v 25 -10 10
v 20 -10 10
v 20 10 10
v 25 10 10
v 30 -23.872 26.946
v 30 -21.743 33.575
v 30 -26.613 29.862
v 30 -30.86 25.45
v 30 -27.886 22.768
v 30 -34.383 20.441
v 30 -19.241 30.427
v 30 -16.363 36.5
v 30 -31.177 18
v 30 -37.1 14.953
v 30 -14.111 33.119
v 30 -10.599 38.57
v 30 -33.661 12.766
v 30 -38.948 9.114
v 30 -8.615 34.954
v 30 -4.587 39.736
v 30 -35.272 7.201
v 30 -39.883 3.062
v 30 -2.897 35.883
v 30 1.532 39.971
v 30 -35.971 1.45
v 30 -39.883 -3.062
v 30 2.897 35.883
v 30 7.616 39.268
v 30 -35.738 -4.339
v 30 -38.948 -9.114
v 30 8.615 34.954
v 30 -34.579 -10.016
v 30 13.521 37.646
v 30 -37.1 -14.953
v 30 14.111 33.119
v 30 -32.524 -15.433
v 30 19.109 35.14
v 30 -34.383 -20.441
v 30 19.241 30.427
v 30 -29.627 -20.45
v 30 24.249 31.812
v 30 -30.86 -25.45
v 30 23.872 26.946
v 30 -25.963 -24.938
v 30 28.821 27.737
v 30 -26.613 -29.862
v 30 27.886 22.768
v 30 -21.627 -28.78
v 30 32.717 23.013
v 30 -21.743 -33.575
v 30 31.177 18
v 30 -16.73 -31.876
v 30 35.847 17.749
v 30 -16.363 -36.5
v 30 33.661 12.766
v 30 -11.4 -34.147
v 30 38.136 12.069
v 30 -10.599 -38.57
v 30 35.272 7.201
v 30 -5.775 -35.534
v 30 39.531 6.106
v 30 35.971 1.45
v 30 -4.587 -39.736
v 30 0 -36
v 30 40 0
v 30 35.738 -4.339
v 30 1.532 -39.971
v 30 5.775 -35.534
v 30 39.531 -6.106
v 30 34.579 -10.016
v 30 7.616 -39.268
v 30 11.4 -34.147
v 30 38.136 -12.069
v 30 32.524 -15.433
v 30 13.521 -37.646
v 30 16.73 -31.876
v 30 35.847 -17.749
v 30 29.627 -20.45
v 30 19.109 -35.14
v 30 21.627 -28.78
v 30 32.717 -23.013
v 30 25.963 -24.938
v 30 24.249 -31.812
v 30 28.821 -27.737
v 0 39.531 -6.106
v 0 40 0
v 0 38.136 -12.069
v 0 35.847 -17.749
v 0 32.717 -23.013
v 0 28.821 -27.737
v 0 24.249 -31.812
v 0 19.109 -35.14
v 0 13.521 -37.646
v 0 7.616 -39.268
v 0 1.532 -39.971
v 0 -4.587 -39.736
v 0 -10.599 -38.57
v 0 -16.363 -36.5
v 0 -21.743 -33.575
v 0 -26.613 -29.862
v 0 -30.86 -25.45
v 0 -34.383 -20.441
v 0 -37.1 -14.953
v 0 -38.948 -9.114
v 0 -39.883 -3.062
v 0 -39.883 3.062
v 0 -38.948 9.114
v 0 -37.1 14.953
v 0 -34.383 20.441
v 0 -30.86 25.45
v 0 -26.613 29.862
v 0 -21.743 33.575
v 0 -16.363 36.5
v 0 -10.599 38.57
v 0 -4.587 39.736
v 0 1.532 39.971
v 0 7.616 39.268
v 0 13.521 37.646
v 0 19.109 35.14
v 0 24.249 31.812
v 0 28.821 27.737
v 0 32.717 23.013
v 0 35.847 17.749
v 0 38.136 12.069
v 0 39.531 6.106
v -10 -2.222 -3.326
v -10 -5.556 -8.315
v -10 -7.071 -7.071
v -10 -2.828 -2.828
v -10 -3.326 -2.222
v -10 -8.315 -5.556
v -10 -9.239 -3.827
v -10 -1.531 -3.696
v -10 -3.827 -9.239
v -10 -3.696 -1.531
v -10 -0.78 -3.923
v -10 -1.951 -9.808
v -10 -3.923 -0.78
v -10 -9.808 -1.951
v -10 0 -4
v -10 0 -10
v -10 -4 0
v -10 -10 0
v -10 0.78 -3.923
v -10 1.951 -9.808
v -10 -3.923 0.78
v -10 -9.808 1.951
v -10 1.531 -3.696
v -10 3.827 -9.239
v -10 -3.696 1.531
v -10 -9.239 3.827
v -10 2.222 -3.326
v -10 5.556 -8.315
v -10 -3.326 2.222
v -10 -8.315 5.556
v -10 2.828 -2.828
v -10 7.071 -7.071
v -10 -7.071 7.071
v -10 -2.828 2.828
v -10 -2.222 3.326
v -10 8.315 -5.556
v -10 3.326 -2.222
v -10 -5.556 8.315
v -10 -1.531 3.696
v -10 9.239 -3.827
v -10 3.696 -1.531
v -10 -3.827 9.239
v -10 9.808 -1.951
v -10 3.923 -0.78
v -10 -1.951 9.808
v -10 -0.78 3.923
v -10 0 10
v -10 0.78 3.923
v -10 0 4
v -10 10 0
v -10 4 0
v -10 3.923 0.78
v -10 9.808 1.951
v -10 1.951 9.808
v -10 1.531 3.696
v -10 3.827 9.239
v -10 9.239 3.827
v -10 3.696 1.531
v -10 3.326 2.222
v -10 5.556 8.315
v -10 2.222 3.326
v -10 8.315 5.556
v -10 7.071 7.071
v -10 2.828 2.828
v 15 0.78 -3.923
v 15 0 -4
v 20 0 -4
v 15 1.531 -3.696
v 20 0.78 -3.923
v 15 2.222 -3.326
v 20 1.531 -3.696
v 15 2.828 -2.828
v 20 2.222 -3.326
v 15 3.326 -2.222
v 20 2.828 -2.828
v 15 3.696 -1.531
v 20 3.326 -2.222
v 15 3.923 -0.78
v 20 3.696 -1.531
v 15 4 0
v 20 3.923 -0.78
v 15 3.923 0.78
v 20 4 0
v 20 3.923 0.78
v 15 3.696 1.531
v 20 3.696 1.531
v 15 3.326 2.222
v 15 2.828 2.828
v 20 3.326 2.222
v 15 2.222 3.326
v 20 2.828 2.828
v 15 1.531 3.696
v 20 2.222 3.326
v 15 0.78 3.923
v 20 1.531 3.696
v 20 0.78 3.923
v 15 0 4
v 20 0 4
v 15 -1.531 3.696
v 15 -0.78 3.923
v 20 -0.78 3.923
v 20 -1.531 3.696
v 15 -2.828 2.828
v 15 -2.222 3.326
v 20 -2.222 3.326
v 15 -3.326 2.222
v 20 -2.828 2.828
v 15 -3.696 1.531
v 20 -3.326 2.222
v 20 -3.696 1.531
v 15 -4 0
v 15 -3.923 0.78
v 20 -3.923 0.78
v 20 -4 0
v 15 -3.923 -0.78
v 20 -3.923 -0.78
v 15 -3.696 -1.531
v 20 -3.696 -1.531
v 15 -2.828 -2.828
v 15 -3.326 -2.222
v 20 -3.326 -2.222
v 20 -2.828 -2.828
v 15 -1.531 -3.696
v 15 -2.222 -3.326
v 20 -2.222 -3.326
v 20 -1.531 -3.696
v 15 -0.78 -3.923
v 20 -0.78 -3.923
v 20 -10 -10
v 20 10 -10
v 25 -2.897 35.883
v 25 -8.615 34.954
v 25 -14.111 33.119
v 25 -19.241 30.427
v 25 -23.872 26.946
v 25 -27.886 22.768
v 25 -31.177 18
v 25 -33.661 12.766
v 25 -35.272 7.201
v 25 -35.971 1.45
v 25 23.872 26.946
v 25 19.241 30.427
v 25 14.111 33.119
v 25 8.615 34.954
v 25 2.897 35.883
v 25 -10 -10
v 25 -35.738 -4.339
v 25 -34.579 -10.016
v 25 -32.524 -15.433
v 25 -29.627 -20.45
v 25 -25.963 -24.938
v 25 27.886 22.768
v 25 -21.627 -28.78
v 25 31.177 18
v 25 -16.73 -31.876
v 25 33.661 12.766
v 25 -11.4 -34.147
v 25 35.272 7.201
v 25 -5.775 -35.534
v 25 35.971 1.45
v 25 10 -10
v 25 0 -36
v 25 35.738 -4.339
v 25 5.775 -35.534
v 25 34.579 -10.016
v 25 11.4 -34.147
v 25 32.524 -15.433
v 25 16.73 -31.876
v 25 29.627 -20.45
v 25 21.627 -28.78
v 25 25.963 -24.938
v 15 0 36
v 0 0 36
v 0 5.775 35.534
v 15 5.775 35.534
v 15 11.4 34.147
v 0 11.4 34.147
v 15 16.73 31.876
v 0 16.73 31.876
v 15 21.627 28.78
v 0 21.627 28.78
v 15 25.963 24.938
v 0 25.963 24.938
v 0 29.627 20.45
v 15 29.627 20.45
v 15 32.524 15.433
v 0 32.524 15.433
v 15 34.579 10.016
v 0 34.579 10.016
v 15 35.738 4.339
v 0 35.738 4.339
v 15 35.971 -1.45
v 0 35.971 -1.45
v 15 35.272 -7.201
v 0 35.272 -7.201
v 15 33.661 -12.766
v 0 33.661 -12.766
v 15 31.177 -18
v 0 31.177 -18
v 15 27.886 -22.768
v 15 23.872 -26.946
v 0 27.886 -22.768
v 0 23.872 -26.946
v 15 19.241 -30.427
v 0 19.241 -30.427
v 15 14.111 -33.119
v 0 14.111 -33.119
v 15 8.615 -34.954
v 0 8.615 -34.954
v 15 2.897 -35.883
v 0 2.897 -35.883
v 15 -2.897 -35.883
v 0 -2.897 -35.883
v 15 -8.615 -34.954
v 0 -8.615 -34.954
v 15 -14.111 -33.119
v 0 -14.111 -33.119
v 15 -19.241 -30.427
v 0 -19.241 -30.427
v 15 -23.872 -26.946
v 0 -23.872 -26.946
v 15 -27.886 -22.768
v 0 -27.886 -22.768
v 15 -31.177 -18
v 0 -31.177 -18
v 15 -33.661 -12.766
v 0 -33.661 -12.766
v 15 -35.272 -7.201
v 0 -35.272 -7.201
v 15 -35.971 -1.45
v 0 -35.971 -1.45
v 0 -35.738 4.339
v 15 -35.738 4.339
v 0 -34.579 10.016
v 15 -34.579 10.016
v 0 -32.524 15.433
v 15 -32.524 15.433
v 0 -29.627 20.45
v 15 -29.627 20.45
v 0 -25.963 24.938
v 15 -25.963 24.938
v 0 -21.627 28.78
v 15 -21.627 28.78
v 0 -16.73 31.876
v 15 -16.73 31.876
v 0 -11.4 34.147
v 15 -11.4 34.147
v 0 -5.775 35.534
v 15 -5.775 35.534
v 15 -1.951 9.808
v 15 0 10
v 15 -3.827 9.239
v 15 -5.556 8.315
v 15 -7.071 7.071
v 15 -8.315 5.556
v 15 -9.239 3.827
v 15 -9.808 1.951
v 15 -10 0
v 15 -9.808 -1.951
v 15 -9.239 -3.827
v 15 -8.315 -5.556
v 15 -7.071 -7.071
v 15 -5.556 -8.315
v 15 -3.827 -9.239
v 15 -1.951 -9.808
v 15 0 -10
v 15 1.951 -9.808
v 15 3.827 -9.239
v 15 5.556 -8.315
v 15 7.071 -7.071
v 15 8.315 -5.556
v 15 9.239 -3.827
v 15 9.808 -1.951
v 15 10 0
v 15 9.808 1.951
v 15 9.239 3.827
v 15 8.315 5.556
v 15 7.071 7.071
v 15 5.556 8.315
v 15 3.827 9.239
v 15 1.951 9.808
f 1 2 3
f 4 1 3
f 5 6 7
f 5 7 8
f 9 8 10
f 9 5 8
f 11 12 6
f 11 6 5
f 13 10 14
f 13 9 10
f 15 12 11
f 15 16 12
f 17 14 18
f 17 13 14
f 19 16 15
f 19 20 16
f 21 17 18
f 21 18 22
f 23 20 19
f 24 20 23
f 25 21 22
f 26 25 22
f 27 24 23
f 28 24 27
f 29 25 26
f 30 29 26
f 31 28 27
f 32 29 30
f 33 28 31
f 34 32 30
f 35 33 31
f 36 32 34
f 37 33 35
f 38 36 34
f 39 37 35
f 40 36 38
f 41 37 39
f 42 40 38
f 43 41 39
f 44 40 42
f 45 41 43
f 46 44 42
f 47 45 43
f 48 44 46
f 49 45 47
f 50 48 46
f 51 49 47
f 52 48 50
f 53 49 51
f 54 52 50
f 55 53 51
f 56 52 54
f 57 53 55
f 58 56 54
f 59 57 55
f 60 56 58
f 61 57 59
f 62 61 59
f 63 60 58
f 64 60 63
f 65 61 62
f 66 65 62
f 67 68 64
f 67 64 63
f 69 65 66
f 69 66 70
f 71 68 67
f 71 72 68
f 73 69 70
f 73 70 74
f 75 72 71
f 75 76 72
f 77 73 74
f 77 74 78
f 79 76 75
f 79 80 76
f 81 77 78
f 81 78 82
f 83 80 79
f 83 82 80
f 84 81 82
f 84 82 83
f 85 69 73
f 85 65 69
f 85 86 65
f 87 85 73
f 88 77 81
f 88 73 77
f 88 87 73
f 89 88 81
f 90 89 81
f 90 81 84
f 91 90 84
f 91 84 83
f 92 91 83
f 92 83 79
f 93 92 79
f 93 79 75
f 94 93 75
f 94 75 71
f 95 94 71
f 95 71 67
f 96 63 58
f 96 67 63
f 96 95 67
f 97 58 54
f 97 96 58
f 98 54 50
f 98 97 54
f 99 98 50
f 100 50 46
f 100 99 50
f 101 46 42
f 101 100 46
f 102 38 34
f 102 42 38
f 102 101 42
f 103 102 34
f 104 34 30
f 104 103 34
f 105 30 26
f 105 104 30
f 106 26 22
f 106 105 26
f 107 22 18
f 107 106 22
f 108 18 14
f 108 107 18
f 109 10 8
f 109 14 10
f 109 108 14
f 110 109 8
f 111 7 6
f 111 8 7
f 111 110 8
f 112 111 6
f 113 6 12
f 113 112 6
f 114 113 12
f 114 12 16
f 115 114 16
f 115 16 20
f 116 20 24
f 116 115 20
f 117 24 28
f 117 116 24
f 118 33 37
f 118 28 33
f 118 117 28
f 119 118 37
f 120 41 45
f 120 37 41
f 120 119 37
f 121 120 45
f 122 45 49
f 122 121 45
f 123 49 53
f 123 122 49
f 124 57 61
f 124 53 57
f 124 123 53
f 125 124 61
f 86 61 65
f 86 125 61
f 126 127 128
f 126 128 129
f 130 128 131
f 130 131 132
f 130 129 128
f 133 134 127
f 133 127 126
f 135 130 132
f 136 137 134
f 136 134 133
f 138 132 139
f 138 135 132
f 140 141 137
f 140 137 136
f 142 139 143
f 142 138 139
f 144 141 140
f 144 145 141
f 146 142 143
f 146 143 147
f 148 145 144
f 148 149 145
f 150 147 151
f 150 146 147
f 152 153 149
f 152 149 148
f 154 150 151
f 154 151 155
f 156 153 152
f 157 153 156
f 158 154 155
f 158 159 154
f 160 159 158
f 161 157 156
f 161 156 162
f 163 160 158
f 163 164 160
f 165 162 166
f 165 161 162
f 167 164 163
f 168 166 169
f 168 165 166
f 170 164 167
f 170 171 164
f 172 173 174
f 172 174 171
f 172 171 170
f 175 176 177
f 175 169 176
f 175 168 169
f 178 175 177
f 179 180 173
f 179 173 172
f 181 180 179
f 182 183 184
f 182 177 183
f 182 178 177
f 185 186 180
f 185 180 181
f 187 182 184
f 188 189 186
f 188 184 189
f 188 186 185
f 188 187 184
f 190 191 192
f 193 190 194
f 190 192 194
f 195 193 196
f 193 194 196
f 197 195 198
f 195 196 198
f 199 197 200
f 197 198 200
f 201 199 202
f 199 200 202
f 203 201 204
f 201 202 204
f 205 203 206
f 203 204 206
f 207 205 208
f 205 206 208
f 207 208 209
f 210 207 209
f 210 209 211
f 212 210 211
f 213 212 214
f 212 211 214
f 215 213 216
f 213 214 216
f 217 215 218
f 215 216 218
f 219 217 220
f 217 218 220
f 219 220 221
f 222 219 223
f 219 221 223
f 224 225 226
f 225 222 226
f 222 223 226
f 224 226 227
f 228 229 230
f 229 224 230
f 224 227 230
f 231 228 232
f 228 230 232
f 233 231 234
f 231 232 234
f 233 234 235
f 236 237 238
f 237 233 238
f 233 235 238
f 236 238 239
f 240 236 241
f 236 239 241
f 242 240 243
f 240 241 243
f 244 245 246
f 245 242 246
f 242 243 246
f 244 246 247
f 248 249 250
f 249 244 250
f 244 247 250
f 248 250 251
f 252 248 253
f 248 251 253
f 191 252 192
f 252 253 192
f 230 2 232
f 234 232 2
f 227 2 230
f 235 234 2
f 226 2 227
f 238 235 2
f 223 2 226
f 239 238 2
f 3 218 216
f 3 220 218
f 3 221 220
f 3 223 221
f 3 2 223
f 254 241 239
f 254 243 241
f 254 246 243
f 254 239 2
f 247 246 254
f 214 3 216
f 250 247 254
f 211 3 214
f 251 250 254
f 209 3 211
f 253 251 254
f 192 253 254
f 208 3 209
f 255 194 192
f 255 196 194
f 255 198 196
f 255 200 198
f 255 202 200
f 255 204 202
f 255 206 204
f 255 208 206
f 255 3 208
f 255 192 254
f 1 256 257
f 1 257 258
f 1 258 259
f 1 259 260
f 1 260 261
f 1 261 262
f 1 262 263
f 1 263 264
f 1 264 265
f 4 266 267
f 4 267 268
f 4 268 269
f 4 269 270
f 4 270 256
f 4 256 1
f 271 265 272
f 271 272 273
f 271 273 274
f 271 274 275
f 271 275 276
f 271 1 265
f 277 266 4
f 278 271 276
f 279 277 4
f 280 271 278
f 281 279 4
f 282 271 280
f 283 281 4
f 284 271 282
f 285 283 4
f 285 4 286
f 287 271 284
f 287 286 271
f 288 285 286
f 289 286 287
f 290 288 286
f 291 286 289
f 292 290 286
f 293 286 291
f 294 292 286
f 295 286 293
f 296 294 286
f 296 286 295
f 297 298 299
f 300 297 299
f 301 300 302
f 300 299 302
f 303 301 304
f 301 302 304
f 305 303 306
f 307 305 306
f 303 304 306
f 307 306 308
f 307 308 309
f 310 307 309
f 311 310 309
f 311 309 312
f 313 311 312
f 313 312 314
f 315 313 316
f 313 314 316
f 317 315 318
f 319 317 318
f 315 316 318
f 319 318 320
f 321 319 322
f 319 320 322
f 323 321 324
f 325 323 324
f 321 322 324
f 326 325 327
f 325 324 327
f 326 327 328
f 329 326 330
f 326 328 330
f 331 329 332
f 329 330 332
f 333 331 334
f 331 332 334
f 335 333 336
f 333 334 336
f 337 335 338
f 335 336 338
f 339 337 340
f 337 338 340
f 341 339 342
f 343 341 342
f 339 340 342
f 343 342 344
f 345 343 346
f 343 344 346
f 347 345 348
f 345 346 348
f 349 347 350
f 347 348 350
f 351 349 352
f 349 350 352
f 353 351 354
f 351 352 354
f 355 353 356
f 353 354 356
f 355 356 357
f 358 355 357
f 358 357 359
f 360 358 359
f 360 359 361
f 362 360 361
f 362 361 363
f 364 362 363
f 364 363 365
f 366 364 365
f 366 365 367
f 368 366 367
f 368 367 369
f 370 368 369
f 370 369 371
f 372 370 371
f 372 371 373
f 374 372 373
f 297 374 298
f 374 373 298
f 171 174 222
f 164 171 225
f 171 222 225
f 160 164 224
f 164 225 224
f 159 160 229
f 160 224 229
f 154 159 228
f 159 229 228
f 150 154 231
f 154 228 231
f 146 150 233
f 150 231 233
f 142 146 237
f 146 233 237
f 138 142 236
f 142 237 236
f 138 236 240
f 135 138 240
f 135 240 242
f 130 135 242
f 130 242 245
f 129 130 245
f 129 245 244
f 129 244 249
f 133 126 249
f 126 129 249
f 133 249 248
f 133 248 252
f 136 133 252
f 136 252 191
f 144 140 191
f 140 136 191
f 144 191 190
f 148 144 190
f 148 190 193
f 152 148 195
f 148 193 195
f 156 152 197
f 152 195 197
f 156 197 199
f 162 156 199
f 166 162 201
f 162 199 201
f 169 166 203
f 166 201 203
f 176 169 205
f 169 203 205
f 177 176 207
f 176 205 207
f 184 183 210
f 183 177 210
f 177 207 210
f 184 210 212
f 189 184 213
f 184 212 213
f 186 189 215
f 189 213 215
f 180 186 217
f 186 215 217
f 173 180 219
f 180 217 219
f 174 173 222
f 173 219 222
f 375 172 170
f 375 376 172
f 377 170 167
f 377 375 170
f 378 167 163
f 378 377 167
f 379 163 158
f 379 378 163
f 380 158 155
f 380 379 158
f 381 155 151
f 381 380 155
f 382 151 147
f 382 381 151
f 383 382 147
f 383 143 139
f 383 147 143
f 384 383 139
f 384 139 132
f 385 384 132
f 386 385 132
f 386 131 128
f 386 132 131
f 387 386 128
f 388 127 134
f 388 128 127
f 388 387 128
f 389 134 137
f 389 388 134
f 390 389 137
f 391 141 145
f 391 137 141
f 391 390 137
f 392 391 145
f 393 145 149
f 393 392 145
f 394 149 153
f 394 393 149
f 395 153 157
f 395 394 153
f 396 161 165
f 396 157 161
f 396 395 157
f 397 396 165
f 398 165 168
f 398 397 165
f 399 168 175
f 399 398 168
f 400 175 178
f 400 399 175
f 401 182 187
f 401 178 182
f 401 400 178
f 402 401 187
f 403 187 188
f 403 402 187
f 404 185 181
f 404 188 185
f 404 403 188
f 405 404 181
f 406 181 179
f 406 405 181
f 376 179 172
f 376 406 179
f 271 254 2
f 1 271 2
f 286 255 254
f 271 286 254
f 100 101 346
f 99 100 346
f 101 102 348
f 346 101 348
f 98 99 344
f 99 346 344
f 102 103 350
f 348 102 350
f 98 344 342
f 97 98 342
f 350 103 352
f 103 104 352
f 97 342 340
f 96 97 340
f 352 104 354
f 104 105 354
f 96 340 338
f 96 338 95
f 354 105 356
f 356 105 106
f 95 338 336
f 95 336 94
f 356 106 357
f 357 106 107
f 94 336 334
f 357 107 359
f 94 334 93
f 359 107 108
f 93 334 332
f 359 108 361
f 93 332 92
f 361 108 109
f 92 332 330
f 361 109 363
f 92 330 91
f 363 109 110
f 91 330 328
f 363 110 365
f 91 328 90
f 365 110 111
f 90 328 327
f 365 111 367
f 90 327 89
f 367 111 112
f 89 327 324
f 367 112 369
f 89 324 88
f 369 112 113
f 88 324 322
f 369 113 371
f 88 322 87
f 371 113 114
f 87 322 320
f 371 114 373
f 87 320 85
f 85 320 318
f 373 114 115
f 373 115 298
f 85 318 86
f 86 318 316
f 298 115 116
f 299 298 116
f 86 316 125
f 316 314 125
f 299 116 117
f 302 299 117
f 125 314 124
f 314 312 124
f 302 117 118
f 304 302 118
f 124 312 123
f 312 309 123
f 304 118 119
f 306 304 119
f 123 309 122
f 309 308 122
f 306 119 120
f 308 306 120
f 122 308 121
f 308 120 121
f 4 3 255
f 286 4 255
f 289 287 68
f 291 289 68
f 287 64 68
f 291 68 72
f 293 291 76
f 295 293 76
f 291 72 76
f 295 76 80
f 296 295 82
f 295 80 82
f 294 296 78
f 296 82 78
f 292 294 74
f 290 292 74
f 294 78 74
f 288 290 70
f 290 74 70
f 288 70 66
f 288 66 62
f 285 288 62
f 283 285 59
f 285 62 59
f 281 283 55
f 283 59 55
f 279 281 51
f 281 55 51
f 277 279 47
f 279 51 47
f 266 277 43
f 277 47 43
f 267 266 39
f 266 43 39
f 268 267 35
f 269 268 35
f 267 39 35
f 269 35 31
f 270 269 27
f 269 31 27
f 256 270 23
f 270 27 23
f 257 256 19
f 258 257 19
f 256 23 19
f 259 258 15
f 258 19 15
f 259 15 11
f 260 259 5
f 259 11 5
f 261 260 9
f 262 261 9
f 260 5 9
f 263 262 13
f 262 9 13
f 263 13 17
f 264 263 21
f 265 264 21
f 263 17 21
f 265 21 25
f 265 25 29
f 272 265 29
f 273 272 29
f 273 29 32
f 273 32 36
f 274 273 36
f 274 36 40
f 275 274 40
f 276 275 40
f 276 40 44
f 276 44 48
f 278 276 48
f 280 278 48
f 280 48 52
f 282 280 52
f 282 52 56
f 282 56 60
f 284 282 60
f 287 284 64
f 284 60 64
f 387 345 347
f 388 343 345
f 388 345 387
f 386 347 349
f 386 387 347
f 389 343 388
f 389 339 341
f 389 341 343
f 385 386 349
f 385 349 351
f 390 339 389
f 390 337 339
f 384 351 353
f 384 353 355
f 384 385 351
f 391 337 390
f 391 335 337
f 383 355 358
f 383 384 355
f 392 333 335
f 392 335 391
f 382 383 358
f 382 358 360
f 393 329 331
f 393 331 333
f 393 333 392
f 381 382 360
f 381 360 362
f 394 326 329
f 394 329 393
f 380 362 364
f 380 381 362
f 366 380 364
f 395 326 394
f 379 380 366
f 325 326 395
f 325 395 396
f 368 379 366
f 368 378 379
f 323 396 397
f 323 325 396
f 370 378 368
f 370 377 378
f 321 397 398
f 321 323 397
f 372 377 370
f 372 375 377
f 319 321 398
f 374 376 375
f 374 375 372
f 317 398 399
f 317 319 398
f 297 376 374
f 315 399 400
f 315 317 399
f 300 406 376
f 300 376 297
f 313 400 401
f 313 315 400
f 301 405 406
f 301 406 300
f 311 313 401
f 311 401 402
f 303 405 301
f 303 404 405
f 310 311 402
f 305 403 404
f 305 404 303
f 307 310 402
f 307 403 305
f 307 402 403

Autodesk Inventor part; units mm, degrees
sketch "Sketch3" plane through (0, 0, 0) normal (1, 0, 0) x (0, 1, 0)
  circle A0 centre (0, 0) radius 40
  circle A1 centre (0, 0) radius 5
  dimension "d2" = 80
  dimension "d3" = 10
extrude "Extrusion1" add sketch "Sketch3" along normal blind 30 contours A0 | A1
sketch "Sketch4" plane through (30, 0, 0) normal (1, 0, 0) x (0, 0, -1)
  circle A0 centre (0, 0) radius 5 construction
  circle A1 centre (0, 0) radius 36
  circle A2 centre (0, 0) radius 40 projected
  dimension "d6" = 4
ref_plane "Work Plane1" through (15, 0, 0) normal (-1, 0, 0) x (0, 0, 1)
extrude "Extrusion2" cut sketch "Sketch4" against normal blind 10 contours A1
sketch "Sketch5" plane through (20, 0, 0) normal (1, 0, 0) x (0, 0, -1)
  circle A0 centre (0, 0) radius 4
  circle A1 centre (0, 0) radius 36 construction
  dimension "d12" = 8
extrude "Extrusion3" cut sketch "Sketch5" against normal up to next
sketch "Sketch6" plane through (20, 0, 0) normal (1, 0, 0) x (0, 0, -1)
  circle A0 centre (0, 0) radius 4 projected
  circle A1 centre (0, 0) radius 36 projected
  line L0 (-10, 10) -> (10, 10)
  line L1 (10, 10) -> (10, -10)
  line L2 (10, -10) -> (-10, -10)
  line L3 (-10, -10) -> (-10, 10)
  line L4 (-10, 10) -> (10, -10) construction
  line L5 (10, 10) -> (-10, -10) construction
  dimension "d13" = 20
extrude "Extrusion4" add sketch "Sketch6" along normal up to surface (10 mm away) contours A1
ref_plane "Work Plane2" through (15, 0, 0) normal (1, 0, 0) x (0, 0, -1)
sketch "Sketch7" plane through (30, 0, 0) normal (1, 0, 0) x (0, 0, -1)
  circle A0 centre (0, 0) radius 36 projected
extrude "Extrusion5" cut sketch "Sketch7" against normal blind 5
sketch "Sketch8" plane through (0, 0, 0) normal (-1, 0, 0) x (0, 0, 1)
  circle A0 centre (0, 0) radius 36 projected
  circle A1 centre (0, 0) radius 4 projected
extrude "Extrusion6" cut sketch "Sketch8" against normal blind 15
sketch "Sketch9" plane through (15, 0, 0) normal (-1, 0, 0) x (0, 0, 1)
  circle A0 centre (0, 0) radius 4 projected
  circle A1 centre (0, 0) radius 10
  dimension "d21" = 20
extrude "Extrusion7" add sketch "Sketch9" along normal blind 25
sketch "Sketch10" plane through (15, 0, 0) normal (-1, 0, 0) x (0, 0, 1)
  line L0 (0, 0) -> (28.2843, 28.2843)
  line L1 (0, 0) -> (-28.2843, 28.2843)
  circle A0 centre (0, 0) radius 40 projected
  circle A1 centre (0, 0) radius 4 construction
  line L2 (0, 0) -> (0, 40) construction
  dimension "d24" = 90
ref_plane "Work Plane3" through (0, 40, 0) normal (0, 1, 0) x (-1, 0, 0)
properties part number "wheel" material "Aluminum 6061"
